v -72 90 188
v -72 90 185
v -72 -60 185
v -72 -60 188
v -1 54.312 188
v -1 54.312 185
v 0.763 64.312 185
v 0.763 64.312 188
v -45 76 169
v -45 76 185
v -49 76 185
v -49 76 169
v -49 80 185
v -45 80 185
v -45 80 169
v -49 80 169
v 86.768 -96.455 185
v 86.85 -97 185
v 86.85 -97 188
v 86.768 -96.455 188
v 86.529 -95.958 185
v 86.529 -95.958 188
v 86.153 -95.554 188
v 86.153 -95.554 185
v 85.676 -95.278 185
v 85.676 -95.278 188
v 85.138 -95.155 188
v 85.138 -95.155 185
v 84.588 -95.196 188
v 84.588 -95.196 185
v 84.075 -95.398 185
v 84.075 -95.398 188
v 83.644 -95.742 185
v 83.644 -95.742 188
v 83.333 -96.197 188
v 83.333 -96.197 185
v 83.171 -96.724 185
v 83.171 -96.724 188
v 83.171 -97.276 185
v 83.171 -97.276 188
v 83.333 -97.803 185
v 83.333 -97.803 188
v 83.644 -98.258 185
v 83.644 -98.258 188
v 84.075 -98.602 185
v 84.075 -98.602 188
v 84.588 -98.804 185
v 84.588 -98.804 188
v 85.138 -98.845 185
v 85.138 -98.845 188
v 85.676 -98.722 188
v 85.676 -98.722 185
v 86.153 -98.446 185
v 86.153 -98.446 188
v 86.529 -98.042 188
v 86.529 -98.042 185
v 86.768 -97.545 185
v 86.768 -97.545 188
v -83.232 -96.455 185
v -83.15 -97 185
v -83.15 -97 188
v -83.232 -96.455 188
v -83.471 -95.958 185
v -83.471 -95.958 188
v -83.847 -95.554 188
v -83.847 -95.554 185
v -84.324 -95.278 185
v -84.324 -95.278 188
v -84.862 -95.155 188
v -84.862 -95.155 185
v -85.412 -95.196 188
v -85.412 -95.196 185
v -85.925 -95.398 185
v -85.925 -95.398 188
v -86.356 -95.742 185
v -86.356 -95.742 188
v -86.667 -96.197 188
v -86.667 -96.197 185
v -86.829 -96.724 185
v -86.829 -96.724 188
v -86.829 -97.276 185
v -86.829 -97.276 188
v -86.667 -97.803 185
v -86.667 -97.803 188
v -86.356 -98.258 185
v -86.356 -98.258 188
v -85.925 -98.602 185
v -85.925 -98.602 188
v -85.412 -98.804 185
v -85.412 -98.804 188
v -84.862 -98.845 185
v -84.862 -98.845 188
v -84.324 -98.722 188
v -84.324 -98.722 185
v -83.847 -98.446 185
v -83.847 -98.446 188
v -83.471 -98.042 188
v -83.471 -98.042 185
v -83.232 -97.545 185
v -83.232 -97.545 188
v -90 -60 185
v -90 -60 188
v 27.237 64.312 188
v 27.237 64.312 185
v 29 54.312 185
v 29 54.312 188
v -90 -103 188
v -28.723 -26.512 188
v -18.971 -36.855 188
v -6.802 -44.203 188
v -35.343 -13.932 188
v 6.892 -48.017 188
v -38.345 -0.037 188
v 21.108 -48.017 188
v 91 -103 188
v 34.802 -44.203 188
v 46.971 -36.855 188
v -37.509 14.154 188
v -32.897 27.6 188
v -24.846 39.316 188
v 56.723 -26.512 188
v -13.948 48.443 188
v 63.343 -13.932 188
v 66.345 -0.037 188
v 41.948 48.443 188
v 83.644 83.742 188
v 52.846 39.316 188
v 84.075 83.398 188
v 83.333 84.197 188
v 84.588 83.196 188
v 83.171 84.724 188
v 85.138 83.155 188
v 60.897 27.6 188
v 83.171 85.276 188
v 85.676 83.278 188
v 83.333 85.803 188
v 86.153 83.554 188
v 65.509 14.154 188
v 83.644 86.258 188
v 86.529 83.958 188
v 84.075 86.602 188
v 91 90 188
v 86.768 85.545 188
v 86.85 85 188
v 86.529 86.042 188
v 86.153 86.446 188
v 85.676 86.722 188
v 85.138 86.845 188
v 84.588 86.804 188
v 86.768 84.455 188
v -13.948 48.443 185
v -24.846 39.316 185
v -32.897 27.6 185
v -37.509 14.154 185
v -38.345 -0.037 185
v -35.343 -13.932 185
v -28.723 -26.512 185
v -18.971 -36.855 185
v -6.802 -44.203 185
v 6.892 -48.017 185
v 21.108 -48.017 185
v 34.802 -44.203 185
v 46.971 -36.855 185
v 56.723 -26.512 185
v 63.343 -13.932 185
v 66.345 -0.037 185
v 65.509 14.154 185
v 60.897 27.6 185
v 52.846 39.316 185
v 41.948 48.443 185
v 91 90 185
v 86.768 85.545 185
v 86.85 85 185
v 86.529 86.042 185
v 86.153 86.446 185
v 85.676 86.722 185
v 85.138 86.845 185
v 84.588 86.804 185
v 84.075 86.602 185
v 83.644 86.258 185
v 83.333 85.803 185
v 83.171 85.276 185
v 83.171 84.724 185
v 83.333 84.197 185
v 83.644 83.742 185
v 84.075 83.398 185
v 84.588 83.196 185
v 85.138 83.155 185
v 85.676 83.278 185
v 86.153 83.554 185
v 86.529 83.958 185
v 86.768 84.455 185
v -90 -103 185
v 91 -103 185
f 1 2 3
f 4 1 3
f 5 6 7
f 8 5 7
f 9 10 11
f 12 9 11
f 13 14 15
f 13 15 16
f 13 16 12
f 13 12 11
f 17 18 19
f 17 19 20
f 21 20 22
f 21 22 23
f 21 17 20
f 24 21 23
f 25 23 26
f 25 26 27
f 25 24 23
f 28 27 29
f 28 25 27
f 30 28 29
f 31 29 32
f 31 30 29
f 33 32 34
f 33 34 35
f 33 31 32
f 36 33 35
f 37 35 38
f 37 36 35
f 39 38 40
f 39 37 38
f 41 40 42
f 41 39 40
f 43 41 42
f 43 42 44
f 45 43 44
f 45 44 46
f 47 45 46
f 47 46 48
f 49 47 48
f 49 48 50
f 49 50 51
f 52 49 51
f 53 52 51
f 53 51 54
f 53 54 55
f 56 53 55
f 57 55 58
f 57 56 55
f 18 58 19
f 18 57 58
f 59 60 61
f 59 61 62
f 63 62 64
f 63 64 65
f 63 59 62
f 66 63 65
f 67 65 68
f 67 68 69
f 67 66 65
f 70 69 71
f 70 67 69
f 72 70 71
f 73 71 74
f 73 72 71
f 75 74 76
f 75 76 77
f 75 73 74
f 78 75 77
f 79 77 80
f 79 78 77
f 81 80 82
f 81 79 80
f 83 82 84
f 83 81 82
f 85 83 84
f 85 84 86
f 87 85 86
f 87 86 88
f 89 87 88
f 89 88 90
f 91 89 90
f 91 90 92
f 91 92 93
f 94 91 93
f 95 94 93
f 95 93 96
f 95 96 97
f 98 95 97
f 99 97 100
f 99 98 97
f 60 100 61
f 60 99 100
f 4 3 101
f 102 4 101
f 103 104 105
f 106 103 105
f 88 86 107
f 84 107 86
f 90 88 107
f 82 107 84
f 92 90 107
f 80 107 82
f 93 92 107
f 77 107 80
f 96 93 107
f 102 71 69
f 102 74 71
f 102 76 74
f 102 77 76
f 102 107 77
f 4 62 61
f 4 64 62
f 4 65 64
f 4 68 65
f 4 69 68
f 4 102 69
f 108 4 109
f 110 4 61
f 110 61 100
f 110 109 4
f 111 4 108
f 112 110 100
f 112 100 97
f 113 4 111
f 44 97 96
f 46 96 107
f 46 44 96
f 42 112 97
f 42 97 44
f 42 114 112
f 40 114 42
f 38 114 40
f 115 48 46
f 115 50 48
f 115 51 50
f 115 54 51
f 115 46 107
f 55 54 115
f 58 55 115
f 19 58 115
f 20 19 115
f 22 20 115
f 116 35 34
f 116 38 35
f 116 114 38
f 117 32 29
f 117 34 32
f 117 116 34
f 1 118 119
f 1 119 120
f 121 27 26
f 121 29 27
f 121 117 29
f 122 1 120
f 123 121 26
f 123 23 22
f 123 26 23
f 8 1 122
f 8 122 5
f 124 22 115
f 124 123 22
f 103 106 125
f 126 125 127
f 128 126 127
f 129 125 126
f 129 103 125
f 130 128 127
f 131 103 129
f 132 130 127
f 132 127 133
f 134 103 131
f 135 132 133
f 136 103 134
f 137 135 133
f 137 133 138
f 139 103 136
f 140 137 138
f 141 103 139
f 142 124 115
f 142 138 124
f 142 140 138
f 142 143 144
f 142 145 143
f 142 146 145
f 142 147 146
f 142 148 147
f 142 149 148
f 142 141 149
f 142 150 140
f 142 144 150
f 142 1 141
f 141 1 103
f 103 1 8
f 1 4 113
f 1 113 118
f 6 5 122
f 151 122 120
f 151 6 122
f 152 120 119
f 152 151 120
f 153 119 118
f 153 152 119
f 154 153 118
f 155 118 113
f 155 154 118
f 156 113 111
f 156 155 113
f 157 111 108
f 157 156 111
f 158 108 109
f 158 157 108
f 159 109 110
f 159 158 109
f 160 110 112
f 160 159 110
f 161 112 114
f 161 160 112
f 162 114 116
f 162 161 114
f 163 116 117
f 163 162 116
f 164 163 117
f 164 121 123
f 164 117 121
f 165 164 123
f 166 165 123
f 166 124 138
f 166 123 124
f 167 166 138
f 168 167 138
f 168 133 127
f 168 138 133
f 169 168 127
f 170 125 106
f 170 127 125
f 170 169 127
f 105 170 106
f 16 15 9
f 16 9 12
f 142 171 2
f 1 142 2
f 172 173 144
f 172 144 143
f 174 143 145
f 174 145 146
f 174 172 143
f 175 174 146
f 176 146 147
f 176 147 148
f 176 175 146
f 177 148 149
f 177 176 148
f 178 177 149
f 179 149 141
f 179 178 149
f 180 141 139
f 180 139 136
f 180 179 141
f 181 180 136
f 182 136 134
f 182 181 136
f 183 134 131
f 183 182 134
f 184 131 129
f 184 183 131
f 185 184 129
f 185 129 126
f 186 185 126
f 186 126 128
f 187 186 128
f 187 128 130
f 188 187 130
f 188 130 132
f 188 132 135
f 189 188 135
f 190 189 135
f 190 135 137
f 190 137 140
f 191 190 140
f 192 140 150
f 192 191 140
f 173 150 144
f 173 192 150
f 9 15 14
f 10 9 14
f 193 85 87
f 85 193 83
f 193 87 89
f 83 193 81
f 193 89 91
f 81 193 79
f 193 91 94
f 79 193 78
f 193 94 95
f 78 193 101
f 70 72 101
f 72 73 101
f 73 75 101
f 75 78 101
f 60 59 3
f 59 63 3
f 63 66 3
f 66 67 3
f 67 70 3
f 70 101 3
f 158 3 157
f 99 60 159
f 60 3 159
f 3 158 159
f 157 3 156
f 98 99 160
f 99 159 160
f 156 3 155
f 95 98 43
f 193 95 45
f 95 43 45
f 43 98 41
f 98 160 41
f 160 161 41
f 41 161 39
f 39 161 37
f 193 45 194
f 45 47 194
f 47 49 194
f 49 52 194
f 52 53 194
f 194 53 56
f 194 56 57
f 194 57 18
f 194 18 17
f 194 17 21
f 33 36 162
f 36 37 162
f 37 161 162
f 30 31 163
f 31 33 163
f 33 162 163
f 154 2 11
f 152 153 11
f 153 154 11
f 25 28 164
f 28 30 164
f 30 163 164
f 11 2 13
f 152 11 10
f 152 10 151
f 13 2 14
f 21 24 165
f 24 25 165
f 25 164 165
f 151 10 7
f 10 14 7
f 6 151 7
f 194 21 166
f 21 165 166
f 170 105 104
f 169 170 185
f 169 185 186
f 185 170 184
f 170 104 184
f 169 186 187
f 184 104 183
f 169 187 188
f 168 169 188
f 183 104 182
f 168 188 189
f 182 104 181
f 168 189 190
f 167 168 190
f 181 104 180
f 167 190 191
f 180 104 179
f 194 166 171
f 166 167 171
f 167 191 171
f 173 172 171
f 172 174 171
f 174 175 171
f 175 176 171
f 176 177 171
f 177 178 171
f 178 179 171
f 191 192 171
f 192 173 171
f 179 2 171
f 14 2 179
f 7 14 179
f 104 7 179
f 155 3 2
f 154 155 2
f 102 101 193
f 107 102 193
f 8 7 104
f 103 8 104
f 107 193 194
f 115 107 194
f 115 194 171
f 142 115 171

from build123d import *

# Parameters (mm, degrees)
SKETCH244_R          = 1.85
PAD019_DEPTH         = 3
POCKET016_DEPTH      = 0.001
POCKET016_DEPTH_BACK = 3.001
SKETCH245_W          = 4
SKETCH245_H          = 16
PAD020_DEPTH         = 4


with BuildPart() as part:
    # Sketch244 → Pad019 (new body)
    with BuildSketch(Plane.XY):
        Polygon((91, 90), (-72, 90), (-72, -60), (-90, -60), (-90, -103), (91, -103), align=None)
        with Locations((85, 85)):
            Circle(SKETCH244_R, mode=Mode.SUBTRACT)
        with Locations((85, -97)):
            Circle(SKETCH244_R, mode=Mode.SUBTRACT)
        with Locations((-85, -97)):
            Circle(SKETCH244_R, mode=Mode.SUBTRACT)
    extrude(amount=PAD019_DEPTH)

    # Sketch243 → Pocket016 (cut, two sides)
    with BuildSketch(Plane.XY) as pocket016_sk:
        with BuildLine():
            ThreePointArc((-1, 54.311529), (14, -48.5), (29, 54.311529))
            Line((27.23673, 64.311529), (29, 54.311529))
            Line((0.76327, 64.311529), (27.23673, 64.311529))
            Line((-1, 54.311529), (0.76327, 64.311529))
        make_face()
    extrude(amount=-POCKET016_DEPTH, mode=Mode.SUBTRACT)
    extrude(pocket016_sk.sketch, amount=POCKET016_DEPTH_BACK, mode=Mode.SUBTRACT)

    # Sketch245 (on Face1 of Pocket016) → Pad020 (join)
    with BuildSketch(Plane(origin=(0, 80, 0), x_dir=(-1, 0, 0), z_dir=(0, 1, 0))):
        with Locations((47, -8)):
            Rectangle(SKETCH245_W, SKETCH245_H)
    extrude(amount=-PAD020_DEPTH)


with BuildPart() as part_1:
    # Body010 placement: moved
    add(part.part.moved(Location((0, 0, 185))))


solid = part_1.part
